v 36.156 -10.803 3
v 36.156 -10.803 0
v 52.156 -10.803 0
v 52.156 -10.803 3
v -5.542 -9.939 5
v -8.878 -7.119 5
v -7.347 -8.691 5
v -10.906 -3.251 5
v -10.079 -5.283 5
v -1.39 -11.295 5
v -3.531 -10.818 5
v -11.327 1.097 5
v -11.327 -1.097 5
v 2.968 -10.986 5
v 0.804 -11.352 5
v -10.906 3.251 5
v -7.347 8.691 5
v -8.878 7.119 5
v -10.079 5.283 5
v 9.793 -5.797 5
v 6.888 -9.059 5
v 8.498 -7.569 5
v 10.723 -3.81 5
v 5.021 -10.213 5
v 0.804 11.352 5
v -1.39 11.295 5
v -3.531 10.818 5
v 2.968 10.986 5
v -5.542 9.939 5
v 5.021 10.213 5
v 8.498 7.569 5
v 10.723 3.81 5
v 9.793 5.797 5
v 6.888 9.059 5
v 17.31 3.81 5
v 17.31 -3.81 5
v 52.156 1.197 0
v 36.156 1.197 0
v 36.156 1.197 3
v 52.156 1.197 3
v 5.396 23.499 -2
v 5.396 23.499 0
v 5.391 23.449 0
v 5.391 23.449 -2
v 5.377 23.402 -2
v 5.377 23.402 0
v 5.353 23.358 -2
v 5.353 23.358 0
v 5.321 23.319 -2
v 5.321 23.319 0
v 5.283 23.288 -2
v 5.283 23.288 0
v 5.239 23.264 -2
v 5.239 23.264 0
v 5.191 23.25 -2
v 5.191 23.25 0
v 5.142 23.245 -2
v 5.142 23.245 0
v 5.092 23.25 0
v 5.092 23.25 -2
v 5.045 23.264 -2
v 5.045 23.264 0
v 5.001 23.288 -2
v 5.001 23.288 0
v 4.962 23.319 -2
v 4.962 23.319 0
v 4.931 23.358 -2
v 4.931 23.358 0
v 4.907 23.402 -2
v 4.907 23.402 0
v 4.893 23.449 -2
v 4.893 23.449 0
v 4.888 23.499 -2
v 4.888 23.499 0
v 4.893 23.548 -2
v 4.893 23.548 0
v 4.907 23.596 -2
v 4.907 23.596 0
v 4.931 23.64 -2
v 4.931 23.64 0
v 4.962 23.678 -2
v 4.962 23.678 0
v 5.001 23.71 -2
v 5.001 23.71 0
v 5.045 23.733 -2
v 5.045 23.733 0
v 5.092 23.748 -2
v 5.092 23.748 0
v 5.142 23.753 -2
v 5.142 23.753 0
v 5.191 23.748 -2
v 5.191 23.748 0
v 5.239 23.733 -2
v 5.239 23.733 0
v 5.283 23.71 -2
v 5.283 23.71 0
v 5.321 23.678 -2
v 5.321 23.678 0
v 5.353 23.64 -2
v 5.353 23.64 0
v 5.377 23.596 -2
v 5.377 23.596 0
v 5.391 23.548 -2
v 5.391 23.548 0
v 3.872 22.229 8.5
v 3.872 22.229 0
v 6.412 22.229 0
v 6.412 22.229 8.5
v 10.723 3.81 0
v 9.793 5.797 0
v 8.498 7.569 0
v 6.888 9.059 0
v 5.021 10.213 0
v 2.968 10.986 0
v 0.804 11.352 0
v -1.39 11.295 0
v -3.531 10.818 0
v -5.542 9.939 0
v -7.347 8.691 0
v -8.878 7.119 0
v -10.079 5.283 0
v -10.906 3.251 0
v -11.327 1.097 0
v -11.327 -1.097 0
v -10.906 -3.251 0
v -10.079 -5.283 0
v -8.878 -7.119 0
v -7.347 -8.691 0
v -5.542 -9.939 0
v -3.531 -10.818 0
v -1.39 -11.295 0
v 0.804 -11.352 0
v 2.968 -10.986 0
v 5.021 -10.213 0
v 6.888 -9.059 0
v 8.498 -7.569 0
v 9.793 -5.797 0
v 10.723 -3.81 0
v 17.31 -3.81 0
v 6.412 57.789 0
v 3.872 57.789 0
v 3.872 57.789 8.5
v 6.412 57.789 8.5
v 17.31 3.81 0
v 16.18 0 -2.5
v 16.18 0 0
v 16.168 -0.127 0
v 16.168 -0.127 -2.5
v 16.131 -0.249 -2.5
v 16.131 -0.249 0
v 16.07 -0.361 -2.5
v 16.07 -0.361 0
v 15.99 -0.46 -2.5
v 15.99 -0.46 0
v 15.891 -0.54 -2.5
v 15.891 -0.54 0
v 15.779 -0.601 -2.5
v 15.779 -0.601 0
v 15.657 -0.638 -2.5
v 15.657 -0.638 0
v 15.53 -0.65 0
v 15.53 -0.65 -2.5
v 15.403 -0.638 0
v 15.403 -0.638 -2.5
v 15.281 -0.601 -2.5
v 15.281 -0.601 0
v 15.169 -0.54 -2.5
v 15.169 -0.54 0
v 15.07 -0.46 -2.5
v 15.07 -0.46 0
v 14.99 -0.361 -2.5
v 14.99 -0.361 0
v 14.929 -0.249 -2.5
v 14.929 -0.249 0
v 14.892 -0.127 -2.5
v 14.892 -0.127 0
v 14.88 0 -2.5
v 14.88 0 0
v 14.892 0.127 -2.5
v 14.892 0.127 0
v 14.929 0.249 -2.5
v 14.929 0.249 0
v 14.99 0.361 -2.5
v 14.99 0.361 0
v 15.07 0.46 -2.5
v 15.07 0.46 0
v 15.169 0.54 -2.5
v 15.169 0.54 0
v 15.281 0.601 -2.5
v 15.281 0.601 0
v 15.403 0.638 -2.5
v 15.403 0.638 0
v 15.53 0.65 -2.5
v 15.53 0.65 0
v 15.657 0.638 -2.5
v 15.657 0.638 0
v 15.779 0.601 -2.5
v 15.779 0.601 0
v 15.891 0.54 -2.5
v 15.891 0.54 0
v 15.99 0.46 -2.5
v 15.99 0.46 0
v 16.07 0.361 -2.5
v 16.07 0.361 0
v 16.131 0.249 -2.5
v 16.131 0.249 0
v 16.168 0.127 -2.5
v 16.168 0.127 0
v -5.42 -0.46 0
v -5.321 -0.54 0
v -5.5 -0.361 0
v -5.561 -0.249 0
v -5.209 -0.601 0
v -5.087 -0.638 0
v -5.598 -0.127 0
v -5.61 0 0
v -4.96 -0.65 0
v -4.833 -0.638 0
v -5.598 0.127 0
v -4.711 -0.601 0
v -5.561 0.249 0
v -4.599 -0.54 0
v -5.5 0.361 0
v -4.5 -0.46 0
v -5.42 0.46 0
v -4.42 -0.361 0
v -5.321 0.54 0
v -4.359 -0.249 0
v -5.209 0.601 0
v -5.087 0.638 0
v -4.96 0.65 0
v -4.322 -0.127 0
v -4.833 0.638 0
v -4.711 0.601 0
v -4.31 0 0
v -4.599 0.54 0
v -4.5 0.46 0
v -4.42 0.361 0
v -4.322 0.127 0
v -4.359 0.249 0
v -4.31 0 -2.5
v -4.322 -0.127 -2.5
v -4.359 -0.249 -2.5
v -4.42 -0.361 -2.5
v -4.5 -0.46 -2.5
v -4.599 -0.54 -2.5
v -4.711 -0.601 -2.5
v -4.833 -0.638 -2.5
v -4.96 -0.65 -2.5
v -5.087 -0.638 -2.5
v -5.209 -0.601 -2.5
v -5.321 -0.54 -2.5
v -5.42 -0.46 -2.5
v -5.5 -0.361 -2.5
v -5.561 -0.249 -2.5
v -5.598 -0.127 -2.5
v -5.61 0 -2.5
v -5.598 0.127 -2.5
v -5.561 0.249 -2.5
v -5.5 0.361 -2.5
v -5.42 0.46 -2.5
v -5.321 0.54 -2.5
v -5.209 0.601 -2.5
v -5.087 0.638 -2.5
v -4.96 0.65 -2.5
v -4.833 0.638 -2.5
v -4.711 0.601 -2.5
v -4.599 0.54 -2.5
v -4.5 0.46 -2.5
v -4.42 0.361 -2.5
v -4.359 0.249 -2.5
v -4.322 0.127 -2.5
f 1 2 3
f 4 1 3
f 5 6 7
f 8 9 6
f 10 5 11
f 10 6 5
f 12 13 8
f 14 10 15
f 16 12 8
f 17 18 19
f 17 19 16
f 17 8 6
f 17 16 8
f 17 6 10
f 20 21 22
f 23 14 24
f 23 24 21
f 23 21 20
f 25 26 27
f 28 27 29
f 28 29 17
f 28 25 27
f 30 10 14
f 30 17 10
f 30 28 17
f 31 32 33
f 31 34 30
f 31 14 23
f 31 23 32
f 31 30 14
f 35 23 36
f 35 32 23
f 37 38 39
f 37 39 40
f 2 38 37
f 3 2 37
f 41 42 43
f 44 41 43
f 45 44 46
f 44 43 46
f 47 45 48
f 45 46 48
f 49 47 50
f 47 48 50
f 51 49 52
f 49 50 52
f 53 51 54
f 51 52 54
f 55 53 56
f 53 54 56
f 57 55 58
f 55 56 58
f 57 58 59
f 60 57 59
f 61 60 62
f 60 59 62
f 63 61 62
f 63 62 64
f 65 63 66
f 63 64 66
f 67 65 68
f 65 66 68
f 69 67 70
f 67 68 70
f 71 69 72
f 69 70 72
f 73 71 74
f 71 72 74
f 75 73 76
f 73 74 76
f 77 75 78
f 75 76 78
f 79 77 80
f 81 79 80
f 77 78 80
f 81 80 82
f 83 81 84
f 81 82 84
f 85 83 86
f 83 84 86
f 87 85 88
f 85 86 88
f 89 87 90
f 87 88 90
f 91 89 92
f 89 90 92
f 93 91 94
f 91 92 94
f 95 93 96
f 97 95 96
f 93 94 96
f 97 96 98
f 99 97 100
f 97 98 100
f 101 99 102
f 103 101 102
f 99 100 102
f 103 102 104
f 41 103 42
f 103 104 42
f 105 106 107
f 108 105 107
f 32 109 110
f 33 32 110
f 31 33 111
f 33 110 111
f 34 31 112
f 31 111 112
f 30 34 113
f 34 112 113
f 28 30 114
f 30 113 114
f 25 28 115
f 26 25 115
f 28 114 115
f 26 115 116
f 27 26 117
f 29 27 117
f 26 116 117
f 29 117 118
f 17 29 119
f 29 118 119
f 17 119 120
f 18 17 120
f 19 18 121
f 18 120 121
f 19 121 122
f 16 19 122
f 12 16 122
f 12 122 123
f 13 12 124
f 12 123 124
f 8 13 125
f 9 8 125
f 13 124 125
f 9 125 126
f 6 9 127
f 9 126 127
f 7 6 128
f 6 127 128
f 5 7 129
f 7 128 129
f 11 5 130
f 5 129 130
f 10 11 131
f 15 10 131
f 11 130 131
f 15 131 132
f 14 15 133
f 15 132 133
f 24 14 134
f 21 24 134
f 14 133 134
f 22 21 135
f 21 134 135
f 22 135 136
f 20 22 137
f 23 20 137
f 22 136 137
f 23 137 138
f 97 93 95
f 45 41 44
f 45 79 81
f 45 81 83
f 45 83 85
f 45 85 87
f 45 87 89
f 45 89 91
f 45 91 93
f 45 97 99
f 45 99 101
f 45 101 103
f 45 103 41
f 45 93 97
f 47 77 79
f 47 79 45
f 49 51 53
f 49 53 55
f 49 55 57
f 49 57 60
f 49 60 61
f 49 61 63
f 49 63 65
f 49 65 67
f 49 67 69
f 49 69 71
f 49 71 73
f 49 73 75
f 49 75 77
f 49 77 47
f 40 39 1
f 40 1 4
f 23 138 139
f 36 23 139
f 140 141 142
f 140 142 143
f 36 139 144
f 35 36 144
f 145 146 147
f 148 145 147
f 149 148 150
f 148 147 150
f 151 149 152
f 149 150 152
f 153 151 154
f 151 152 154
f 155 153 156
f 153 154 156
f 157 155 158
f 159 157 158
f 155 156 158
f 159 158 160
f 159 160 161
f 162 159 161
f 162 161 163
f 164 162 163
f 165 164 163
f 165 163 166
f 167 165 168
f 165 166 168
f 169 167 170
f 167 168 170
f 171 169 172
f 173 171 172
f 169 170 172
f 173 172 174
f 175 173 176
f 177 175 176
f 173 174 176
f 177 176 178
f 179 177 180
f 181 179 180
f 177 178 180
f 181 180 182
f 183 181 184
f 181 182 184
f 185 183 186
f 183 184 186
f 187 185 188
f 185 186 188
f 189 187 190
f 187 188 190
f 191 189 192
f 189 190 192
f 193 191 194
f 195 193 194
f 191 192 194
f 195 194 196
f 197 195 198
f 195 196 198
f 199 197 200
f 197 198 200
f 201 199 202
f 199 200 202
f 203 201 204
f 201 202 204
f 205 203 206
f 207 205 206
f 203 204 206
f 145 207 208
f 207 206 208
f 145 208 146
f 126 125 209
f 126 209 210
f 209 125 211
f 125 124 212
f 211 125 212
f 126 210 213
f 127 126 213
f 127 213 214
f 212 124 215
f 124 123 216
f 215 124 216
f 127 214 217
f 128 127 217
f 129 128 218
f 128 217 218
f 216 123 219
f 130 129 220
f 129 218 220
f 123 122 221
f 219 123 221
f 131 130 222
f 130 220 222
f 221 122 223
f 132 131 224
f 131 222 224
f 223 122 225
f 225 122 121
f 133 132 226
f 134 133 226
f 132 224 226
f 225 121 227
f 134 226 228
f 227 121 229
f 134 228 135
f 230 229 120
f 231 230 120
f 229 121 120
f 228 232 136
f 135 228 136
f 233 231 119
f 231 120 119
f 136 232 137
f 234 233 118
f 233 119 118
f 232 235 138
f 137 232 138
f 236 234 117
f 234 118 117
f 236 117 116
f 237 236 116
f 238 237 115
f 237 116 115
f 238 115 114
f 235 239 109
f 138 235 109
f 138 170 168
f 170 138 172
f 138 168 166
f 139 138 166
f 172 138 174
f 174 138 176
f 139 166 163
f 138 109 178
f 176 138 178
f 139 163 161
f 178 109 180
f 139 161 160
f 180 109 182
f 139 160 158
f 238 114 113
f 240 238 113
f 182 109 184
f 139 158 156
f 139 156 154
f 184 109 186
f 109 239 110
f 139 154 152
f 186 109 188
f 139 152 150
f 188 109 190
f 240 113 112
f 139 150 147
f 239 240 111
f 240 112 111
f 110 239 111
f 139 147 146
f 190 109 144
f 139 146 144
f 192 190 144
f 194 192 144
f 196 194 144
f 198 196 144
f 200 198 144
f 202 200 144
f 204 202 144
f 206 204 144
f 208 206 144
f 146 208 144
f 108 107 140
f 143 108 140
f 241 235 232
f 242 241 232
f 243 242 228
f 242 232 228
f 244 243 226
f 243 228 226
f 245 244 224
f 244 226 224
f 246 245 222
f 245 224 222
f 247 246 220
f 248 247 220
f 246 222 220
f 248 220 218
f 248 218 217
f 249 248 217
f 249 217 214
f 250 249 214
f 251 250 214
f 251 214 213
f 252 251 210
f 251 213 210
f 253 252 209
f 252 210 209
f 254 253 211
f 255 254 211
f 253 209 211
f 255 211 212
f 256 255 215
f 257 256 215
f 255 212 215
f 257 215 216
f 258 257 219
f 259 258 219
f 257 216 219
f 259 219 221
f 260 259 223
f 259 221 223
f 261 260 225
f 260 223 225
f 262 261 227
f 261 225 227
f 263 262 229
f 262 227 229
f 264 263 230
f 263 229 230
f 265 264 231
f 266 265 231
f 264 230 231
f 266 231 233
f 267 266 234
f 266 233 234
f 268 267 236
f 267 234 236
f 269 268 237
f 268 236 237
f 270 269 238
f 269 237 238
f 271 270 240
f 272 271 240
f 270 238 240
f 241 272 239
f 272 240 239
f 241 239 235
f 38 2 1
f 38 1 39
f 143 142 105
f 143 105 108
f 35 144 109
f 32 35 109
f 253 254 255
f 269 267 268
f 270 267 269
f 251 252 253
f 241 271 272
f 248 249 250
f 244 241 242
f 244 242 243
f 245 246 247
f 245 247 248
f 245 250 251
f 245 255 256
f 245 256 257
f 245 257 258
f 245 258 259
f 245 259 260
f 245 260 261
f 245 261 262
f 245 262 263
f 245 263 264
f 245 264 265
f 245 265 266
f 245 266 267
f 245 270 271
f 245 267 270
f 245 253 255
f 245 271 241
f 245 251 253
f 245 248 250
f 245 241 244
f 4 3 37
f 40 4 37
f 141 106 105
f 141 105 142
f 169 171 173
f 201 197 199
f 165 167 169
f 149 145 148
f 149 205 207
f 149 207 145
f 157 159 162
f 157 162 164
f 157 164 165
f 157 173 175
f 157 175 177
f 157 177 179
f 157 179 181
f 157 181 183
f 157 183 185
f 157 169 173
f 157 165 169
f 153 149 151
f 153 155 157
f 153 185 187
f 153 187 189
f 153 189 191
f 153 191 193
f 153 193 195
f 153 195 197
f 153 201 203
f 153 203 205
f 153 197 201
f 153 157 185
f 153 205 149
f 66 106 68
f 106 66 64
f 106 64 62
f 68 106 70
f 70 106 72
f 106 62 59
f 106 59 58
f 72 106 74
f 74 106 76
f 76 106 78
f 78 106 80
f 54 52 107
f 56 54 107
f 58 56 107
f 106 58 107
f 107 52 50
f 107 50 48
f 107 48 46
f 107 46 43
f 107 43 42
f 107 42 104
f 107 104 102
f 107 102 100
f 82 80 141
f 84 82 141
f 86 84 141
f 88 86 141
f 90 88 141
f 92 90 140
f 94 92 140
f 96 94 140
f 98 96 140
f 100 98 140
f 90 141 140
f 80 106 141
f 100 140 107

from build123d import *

# Parameters (mm, degrees)
PAD_DEPTH    = 5
SKETCH001_R  = 0.65
PAD001_DEPTH = 2.5
SKETCH002_W  = 16
SKETCH002_H  = 12
PAD002_DEPTH = 3
SKETCH003_W  = 2.54
SKETCH003_H  = 35.56
PAD003_DEPTH = 8.5
SKETCH004_R  = 0.254
PAD004_DEPTH = 2


with BuildPart() as coin_cell_holder:
    # Sketch → Pad (new body)
    with BuildSketch(Plane.XY):
        with BuildLine():
            ThreePointArc((10.72326, 3.81), (-11.38, 0), (10.72326, -3.81))
            Line((10.72326, -3.81), (17.31, -3.81))
            Line((17.31, -3.81), (17.31, 3.81))
            Line((17.31, 3.81), (10.72326, 3.81))
        make_face()
    extrude(amount=PAD_DEPTH)

    # Sketch001 (on Face5 of Pad) → Pad001 (join)
    with BuildSketch(Plane(origin=(0, 0, 0), x_dir=(1, 0, 0), z_dir=(0, 0, -1))):
        with Locations((-4.96, 0)):
            Circle(SKETCH001_R)
        with Locations((15.53, 0)):
            Circle(SKETCH001_R)
    extrude(amount=PAD001_DEPTH)


with BuildPart() as psk_receiver:
    # Sketch002 → Pad002 (new body)
    with BuildSketch(Plane.XY):
        with Locations((44.156133, -4.803074)):
            Rectangle(SKETCH002_W, SKETCH002_H)
    extrude(amount=PAD002_DEPTH)


with BuildPart() as teensy_header:
    # Sketch003 → Pad003 (new body)
    with BuildSketch(Plane.XY):
        with Locations((5.141866, 40.008708)):
            Rectangle(SKETCH003_W, SKETCH003_H)
    extrude(amount=PAD003_DEPTH)

    # Sketch004 (on Face5 of Pad003) → Pad004 (join)
    with BuildSketch(Plane(origin=(0, 0, 0), x_dir=(1, 0, 0), z_dir=(0, 0, -1))):
        with Locations((5.141866, -23.498708)):
            Circle(SKETCH004_R)
    extrude(amount=PAD004_DEPTH)


solid = Compound([coin_cell_holder.part, psk_receiver.part, teensy_header.part])
